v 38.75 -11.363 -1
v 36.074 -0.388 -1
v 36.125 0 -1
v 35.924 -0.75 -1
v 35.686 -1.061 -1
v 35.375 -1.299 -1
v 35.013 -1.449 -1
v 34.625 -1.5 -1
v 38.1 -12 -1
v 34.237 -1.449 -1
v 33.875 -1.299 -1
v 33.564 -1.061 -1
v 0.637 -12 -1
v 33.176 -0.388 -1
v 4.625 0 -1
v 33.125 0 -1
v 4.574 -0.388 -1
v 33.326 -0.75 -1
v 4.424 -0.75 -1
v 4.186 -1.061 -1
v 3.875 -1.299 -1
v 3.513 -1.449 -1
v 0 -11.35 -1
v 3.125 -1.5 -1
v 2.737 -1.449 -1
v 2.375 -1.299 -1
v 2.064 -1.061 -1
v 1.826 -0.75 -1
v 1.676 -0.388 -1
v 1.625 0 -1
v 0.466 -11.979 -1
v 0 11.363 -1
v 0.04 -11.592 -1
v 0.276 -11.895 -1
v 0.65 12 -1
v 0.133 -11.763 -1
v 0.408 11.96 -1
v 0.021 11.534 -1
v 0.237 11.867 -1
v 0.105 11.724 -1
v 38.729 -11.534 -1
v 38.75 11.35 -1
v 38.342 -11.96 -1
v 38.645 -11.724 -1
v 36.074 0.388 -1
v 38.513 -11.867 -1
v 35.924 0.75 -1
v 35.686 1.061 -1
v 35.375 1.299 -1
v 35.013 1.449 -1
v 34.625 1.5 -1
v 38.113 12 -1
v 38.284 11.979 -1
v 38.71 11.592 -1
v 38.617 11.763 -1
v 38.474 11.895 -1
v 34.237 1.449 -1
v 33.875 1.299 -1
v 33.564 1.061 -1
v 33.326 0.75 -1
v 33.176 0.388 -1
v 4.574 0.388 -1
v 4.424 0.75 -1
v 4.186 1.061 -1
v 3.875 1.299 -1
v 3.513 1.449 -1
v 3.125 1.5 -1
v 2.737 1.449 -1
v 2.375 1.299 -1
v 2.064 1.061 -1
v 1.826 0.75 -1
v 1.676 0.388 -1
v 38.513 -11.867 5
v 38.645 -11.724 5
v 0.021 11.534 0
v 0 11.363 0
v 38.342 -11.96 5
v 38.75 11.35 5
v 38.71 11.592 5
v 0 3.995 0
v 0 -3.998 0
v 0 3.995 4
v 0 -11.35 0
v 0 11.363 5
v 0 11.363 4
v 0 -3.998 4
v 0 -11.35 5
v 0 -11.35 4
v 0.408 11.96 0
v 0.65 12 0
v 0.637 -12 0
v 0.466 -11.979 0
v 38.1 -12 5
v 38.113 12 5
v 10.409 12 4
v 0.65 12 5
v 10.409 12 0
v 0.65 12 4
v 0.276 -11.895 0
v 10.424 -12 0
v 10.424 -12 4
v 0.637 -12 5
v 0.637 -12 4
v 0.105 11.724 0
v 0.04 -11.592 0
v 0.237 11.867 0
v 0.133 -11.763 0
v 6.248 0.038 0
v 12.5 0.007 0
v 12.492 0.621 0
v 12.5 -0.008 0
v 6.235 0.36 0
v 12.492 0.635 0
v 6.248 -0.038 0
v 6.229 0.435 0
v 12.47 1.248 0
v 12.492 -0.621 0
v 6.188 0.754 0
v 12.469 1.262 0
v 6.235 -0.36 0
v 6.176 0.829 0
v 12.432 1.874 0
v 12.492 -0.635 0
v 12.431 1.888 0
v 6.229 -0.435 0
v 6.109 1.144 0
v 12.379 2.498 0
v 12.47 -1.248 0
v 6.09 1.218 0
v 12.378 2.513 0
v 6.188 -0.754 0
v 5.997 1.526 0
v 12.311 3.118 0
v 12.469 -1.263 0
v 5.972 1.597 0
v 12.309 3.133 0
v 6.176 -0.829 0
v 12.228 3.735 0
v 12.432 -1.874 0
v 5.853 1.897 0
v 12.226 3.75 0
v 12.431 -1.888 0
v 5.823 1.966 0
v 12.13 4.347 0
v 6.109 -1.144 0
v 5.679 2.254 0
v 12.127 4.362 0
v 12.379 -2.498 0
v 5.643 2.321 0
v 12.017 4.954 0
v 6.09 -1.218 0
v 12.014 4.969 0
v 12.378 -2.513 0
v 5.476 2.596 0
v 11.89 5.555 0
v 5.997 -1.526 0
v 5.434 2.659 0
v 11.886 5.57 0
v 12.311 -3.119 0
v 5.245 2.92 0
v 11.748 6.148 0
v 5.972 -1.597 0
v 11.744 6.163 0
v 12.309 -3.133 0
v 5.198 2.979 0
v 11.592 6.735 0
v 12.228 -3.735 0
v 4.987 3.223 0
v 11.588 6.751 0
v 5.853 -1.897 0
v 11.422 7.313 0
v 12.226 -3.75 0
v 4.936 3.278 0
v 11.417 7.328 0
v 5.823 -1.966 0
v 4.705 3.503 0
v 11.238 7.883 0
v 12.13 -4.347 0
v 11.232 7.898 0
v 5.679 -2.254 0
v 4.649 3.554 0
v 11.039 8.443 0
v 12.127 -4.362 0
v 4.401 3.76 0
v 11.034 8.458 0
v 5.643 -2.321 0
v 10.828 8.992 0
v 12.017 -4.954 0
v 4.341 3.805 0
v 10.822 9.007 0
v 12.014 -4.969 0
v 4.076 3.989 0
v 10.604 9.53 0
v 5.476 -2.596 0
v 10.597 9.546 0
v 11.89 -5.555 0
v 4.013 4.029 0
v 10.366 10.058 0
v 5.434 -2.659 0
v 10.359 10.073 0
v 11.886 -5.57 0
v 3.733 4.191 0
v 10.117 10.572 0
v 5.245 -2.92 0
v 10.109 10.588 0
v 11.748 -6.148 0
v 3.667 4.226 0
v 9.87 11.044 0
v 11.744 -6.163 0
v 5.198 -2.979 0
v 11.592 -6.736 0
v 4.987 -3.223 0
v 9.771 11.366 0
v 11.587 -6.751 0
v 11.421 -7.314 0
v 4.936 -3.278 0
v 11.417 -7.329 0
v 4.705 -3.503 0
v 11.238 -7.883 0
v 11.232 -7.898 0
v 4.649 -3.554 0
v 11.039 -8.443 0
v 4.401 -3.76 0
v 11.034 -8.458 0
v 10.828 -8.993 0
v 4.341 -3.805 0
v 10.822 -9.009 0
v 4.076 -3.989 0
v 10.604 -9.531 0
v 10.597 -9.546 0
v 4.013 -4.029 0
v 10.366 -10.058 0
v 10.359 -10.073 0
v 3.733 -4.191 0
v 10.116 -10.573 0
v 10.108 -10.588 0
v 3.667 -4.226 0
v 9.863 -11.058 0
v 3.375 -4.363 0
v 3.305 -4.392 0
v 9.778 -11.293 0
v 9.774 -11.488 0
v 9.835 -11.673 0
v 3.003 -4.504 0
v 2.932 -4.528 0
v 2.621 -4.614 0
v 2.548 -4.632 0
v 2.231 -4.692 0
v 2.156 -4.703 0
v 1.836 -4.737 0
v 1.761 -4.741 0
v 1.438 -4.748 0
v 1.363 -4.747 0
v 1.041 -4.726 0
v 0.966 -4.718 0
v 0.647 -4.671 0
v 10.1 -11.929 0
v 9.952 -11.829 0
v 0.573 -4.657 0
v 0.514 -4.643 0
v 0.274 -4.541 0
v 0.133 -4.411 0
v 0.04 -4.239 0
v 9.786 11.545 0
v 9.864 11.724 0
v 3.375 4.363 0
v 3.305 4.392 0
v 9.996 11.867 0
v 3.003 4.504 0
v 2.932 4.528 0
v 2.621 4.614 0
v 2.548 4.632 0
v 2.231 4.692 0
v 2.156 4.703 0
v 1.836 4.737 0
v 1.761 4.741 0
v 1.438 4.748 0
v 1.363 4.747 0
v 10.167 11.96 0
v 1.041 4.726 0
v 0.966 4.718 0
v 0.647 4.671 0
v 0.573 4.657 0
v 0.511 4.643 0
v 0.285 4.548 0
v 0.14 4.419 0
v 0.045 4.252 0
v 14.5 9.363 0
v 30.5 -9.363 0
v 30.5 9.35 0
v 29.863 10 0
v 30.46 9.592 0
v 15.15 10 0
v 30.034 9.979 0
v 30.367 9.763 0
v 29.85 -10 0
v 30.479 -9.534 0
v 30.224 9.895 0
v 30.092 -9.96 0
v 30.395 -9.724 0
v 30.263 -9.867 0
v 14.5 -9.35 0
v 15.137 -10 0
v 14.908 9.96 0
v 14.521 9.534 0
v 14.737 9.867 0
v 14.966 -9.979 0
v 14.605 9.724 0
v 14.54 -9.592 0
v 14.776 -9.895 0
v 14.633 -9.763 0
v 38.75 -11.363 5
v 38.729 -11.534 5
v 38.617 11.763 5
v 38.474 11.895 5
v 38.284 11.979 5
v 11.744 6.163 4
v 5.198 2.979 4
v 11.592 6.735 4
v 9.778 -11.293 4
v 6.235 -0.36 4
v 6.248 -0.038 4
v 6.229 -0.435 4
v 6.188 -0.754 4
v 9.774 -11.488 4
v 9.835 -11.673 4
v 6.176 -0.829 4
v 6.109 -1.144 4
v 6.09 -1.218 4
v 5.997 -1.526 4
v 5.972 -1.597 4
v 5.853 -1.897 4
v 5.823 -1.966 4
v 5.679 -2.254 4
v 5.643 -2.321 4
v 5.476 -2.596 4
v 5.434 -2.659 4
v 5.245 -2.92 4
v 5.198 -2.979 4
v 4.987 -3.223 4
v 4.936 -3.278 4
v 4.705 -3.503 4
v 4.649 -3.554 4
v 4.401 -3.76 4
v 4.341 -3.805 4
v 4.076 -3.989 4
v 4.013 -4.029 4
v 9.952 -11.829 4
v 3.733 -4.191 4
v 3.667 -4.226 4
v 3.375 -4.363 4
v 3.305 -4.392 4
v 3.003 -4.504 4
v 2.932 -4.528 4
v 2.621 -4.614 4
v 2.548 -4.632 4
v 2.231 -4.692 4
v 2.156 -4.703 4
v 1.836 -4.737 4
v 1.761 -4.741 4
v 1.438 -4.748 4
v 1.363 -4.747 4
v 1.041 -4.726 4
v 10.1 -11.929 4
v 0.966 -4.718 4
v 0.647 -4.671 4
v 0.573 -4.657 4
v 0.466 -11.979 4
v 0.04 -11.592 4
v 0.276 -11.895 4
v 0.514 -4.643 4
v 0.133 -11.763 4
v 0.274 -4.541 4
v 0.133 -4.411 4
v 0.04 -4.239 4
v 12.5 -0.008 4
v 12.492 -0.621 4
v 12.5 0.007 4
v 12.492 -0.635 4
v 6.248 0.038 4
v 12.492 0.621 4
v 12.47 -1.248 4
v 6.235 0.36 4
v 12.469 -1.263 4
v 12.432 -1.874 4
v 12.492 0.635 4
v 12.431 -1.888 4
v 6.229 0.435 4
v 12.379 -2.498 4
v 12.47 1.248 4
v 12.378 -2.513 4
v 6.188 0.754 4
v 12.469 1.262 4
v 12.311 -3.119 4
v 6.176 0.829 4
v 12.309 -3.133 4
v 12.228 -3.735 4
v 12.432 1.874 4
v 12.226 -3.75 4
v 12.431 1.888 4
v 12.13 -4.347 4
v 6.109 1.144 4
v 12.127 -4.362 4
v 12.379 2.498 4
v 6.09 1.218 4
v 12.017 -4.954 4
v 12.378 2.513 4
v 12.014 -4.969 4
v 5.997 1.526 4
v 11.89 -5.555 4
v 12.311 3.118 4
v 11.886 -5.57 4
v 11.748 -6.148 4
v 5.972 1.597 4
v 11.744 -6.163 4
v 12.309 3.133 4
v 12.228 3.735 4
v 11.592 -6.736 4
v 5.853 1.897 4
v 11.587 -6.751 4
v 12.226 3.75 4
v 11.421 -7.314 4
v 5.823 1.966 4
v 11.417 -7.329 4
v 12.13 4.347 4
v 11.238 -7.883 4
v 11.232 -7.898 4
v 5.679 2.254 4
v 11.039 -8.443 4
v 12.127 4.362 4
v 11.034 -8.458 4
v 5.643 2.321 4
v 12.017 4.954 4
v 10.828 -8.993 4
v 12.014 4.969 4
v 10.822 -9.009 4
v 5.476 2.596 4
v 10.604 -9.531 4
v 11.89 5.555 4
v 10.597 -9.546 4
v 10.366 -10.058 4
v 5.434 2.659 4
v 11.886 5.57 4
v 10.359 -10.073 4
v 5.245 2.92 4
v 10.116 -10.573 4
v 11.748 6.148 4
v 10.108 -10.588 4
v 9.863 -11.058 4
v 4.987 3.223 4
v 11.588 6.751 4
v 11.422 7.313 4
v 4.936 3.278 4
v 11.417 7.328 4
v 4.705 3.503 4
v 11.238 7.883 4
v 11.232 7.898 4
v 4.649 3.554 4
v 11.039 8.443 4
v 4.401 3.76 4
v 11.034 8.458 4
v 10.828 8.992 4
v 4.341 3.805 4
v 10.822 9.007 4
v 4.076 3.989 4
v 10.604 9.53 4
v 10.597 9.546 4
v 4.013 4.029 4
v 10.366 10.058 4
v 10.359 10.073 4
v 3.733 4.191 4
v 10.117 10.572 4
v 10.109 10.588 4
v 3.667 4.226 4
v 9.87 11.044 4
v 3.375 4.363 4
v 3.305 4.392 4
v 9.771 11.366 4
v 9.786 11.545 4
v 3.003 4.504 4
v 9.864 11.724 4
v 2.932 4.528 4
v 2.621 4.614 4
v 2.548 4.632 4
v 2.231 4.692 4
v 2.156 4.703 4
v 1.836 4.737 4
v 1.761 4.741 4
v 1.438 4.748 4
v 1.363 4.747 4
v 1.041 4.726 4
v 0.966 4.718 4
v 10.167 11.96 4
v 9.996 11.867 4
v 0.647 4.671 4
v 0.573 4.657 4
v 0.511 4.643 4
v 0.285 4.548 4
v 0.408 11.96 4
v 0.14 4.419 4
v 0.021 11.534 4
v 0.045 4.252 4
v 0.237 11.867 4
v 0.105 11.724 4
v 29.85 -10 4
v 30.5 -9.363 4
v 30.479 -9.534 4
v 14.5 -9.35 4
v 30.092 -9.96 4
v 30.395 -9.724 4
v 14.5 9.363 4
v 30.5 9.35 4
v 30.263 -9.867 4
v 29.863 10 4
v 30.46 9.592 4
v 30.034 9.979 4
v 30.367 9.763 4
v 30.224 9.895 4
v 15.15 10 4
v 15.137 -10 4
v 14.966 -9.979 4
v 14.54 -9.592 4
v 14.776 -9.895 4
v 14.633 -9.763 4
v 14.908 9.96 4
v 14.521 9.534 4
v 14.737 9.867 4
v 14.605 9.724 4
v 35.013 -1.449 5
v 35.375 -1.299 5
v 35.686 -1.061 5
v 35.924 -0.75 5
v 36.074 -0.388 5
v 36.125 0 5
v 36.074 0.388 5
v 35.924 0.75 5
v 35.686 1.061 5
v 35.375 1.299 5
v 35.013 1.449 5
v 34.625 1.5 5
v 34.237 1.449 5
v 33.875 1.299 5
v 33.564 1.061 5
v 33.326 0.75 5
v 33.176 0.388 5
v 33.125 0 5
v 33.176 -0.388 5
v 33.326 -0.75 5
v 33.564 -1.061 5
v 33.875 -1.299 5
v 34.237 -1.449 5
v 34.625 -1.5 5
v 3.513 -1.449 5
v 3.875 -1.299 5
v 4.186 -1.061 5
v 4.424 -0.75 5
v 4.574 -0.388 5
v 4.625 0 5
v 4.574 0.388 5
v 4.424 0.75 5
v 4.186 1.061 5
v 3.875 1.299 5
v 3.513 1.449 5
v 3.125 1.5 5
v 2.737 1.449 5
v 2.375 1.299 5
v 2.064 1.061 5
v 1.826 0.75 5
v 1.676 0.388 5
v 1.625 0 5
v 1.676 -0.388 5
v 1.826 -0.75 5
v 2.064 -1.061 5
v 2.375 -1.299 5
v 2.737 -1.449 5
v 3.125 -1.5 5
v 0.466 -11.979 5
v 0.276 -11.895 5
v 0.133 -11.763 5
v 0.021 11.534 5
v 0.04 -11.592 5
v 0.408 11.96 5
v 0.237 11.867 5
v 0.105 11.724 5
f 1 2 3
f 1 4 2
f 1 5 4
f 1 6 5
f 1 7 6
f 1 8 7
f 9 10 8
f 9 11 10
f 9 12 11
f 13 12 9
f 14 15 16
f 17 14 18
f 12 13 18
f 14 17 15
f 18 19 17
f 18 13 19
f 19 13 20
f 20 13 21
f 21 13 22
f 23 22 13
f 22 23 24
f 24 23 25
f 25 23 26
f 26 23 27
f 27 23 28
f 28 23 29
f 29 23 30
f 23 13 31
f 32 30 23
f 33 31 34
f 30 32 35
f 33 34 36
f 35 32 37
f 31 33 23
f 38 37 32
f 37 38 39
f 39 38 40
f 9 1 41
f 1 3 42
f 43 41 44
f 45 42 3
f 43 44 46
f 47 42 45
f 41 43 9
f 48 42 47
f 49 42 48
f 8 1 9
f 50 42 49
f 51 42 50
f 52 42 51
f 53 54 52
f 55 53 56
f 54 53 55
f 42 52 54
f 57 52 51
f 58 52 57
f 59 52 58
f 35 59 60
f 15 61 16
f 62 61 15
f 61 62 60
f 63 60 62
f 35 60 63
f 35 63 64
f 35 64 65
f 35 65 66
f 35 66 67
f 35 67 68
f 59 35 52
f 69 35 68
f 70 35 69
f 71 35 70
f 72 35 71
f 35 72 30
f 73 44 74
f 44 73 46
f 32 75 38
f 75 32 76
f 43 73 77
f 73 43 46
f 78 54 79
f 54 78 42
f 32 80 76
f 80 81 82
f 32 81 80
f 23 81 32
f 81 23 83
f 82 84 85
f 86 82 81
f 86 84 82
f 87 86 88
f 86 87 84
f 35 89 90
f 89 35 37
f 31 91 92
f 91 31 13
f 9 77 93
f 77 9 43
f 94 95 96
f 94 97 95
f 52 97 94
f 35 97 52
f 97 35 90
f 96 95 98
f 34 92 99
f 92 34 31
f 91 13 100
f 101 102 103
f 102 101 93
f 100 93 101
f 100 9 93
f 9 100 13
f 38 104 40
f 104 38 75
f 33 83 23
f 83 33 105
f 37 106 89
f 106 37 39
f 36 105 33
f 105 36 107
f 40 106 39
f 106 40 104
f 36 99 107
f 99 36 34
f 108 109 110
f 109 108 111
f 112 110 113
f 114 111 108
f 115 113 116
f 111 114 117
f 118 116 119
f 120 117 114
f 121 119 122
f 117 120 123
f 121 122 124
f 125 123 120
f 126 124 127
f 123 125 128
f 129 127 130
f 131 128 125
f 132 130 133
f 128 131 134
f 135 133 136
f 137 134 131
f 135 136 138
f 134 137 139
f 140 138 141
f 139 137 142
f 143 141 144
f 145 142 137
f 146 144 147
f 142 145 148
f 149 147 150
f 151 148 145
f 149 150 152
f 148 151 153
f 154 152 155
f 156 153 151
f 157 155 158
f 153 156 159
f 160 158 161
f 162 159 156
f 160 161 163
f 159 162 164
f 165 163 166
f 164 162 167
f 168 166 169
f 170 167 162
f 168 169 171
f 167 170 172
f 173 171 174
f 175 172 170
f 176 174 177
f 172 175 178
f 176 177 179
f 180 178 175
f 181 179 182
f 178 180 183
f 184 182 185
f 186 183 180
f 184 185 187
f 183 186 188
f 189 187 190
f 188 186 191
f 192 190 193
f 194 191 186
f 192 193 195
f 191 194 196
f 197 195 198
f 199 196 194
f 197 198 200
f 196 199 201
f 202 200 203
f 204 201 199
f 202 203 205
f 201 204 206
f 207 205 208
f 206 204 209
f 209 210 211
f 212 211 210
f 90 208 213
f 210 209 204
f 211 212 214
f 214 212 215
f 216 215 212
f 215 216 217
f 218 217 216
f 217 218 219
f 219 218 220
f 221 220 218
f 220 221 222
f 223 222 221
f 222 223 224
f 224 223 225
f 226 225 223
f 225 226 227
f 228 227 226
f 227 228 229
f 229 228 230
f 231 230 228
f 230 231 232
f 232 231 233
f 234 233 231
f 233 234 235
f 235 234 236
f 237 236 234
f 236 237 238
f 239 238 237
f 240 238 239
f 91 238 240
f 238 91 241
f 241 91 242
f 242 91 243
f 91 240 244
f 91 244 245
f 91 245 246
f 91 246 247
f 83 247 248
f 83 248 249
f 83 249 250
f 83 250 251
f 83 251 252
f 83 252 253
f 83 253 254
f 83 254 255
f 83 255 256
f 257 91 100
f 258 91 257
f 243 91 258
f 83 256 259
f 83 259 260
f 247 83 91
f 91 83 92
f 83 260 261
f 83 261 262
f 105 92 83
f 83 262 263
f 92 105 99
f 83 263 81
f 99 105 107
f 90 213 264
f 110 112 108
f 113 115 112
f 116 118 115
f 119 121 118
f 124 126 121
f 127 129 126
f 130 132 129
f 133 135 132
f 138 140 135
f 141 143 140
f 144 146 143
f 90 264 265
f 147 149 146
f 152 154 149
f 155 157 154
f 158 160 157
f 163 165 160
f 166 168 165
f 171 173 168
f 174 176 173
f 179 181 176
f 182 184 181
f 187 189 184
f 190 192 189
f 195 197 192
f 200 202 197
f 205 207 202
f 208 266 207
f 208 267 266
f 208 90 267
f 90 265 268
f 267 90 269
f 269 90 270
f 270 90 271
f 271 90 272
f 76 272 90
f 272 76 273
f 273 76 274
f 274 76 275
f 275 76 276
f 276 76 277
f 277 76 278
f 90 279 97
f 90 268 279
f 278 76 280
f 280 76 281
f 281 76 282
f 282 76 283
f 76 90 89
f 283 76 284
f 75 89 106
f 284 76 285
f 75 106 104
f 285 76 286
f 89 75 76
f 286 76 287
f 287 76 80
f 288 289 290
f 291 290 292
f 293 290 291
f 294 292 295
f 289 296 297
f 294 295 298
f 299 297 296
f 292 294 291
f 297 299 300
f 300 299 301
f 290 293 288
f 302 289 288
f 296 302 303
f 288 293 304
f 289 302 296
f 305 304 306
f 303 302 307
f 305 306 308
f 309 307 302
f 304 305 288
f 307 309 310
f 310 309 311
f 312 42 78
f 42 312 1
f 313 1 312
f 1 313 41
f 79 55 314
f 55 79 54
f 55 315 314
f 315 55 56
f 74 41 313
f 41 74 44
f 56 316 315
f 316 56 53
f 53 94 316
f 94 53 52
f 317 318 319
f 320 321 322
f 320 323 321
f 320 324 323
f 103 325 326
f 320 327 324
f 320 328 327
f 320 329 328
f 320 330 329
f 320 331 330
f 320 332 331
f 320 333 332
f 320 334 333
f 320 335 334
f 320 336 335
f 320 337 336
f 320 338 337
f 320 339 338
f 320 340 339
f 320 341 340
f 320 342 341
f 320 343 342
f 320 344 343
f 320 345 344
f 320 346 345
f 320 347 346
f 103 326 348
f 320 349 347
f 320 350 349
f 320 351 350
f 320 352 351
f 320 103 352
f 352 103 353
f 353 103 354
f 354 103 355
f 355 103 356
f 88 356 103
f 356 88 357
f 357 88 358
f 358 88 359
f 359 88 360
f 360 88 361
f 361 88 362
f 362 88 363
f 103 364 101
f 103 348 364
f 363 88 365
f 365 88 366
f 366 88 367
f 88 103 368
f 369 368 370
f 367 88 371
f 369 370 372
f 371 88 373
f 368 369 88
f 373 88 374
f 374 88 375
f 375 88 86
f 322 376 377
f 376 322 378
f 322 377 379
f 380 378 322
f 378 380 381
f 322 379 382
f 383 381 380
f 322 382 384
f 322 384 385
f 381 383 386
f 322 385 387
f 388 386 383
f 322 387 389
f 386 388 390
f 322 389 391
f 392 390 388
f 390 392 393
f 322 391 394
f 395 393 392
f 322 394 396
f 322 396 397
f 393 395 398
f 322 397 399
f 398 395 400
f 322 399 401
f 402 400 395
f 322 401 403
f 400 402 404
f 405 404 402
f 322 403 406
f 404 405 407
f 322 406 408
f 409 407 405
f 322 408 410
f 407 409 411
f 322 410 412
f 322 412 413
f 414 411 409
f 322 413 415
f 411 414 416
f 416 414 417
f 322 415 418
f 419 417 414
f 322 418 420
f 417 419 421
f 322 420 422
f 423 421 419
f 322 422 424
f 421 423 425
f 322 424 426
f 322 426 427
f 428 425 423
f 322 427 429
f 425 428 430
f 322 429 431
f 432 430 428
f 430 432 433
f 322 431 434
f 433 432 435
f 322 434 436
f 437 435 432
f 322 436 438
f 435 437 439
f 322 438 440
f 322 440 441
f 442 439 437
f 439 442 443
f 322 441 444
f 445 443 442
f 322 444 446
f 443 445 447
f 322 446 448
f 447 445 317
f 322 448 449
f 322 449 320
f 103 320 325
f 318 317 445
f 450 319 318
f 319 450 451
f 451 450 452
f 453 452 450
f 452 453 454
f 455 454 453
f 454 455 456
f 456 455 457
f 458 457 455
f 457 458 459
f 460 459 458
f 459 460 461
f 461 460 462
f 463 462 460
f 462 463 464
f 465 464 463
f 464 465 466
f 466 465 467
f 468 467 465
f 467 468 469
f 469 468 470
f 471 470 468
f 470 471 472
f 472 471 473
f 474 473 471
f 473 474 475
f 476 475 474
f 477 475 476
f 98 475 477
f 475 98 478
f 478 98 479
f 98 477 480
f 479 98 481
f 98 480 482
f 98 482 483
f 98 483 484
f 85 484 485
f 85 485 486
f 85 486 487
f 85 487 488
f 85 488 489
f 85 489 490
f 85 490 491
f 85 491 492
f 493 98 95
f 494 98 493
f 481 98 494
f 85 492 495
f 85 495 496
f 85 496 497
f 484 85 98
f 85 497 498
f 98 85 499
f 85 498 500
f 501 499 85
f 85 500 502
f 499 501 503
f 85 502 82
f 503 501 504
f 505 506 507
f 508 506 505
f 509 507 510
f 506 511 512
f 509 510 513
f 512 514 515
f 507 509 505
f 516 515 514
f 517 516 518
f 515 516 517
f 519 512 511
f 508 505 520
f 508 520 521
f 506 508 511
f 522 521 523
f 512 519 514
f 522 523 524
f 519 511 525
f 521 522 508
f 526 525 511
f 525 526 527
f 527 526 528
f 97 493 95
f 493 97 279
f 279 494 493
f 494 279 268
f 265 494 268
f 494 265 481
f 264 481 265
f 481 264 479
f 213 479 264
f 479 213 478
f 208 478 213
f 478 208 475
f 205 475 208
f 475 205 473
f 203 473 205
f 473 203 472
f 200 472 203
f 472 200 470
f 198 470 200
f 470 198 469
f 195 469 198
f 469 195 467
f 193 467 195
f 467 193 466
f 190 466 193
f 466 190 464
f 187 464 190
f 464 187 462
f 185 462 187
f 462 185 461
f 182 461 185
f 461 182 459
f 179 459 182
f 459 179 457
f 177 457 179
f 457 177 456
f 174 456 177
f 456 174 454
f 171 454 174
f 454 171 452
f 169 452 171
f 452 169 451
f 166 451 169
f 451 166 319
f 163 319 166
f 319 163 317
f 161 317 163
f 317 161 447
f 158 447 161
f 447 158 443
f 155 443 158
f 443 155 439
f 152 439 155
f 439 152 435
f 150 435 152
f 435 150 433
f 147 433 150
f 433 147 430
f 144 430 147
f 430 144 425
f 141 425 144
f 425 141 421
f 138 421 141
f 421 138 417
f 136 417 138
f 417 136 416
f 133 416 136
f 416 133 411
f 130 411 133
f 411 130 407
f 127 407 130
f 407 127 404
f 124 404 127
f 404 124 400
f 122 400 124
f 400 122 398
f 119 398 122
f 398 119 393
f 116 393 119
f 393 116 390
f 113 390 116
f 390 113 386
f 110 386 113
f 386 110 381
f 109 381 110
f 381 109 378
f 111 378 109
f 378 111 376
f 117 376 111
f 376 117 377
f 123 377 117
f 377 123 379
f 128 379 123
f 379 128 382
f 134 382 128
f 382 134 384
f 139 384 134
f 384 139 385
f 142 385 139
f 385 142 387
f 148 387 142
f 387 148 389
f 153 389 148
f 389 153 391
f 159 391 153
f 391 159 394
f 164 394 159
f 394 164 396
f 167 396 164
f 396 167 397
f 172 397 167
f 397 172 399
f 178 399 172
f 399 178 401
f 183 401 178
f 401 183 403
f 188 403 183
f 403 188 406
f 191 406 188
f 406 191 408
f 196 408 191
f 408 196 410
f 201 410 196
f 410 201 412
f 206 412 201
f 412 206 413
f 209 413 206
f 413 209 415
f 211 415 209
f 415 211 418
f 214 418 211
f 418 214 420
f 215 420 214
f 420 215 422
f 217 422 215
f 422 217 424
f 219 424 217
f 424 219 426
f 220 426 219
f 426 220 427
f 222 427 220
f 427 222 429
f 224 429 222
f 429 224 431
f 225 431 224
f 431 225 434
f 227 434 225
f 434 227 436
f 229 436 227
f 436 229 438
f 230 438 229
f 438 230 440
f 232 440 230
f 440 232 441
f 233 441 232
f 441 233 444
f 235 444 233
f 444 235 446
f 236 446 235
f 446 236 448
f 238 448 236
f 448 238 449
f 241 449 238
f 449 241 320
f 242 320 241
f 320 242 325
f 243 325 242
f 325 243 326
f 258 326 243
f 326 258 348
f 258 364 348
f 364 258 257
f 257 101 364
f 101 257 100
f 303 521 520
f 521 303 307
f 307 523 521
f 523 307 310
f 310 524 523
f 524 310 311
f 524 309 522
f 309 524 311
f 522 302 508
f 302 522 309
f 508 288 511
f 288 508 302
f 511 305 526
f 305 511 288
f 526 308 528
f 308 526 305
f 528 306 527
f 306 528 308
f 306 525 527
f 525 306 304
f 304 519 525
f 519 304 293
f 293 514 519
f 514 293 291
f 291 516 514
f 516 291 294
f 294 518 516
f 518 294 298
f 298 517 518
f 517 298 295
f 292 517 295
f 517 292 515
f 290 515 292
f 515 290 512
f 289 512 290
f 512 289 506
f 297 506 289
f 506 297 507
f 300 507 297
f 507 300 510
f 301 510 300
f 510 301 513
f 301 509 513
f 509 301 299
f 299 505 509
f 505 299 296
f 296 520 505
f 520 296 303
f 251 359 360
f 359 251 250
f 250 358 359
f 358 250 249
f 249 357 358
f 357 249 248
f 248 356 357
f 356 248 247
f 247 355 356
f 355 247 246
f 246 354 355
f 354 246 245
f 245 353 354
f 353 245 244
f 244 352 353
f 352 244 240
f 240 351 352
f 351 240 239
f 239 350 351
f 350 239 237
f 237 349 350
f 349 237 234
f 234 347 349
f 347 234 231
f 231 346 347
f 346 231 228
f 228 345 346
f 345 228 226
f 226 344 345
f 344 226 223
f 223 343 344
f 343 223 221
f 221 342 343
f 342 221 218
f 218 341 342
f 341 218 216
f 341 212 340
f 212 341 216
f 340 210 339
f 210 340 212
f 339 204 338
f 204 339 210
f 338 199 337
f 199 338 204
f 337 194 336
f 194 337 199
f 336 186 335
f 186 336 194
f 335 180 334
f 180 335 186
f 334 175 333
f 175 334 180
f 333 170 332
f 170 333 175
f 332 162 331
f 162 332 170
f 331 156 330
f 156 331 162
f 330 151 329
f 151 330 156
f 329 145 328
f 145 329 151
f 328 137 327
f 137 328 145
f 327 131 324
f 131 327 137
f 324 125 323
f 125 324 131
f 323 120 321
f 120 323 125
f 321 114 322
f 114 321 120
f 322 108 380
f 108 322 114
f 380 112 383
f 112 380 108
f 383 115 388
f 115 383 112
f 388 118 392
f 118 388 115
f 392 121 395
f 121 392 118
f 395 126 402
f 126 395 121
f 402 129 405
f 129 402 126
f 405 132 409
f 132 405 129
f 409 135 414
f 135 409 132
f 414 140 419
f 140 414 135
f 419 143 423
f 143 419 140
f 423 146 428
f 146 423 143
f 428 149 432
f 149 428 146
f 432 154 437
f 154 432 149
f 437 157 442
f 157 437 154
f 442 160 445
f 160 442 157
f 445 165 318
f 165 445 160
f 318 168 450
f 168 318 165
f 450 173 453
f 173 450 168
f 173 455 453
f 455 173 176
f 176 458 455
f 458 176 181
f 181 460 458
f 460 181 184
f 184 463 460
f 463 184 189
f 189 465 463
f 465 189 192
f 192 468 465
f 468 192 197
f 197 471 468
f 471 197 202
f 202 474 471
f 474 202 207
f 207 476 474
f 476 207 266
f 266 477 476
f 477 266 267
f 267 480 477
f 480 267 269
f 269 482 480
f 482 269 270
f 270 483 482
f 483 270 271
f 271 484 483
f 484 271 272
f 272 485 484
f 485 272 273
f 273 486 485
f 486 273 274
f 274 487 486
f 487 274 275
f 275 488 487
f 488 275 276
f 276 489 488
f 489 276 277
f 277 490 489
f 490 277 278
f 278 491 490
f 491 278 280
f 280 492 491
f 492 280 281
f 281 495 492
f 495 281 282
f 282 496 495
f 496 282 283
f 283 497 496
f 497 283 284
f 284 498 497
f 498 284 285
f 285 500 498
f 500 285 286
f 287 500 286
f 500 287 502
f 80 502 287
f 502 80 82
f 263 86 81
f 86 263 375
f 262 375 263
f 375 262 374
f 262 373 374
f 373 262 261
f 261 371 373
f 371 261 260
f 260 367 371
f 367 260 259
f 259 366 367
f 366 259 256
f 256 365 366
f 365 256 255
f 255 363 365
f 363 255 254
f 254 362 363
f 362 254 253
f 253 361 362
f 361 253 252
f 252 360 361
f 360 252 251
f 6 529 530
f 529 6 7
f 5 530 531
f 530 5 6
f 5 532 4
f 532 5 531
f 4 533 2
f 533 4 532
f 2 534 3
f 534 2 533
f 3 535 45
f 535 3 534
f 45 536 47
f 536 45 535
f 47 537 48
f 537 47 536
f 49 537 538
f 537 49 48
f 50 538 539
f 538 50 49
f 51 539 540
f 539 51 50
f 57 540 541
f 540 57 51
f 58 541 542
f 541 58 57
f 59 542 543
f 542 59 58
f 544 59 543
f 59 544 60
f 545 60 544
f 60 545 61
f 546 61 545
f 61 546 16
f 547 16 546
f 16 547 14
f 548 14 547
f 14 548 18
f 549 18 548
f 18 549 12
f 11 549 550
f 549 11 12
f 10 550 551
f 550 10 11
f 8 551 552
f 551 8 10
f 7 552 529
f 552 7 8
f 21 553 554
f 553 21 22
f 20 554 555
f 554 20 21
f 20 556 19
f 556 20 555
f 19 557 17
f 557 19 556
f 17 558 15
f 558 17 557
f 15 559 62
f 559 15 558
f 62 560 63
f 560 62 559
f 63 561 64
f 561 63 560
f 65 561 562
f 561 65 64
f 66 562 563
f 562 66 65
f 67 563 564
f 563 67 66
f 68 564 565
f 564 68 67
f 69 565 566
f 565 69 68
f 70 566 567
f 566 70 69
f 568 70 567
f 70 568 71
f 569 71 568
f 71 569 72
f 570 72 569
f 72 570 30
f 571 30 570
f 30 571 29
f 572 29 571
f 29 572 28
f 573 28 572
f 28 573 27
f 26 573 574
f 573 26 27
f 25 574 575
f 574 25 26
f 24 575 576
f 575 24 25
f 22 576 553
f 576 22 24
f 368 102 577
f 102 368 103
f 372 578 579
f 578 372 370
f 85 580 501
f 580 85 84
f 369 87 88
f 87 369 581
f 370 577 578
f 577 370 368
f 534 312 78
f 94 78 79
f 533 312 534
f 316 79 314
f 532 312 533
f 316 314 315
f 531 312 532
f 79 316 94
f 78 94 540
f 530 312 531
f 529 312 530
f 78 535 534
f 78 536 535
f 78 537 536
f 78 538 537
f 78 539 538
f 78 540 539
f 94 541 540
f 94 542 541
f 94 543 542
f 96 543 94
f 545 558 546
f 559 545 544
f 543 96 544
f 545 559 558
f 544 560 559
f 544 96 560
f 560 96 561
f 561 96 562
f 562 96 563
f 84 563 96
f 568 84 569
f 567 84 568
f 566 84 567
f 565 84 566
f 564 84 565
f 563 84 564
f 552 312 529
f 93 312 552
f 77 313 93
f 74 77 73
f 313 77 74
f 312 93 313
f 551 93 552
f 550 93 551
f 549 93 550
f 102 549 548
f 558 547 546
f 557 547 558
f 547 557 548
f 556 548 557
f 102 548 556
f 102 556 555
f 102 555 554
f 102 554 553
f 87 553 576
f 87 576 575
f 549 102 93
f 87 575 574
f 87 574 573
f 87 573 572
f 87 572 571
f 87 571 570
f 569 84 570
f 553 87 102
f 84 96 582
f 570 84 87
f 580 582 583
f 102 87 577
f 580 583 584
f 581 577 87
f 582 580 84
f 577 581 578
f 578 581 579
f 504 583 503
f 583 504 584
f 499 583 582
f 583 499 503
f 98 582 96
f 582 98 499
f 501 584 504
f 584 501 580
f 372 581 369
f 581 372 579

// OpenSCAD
/*
 * Slide lock magnet holder
 * By smkent (GitHub) / bulbasaur0 (Printables)
 *
 * Licensed under Creative Commons (4.0 International License) Attribution-ShareAlike
 */

/* [Rendering Options] */
Print_Orientation = true;
Show_Slide = true;
Part = "both"; // ["both": Base and lid, "base": Base, "lid": Lid]

/* [Size] */
Screw_Diameter = 2.5; // [2:0.5:4]
Screw_Hole_Diameter = 3; // [2:0.1:10]

Base_Thickness = 1; // [1:0.1:4]
Lid_Thickness = 1; // [1:0.1:4]

/* [Advanced Options] */

/* [Development Toggles] */

module __end_customizer_options__() { }

// Constants //

$fa = $preview ? $fa : 2;
$fs = $preview ? $fs : 0.4;

slide_size = [12.5, 24, 4];

slide_hole_d = 9.5;
slide_hole_inset = 11;

holder_base_thick = Base_Thickness;
holder_lid_thick = Lid_Thickness;
holder_thick = 2;
holder_size = [20, 24, 2];
holder_screw_d = Screw_Diameter;
holder_screw_hole_d = Screw_Hole_Diameter;
holder_screw_base_d = holder_screw_d * 2.5;

rr = 0.6;

// Functions //

function vec_add(vector, add) = [for (v = vector) v + add];

// Modules //

module slide_body_shape() {
    intersection() {
        difference() {
            translate([0, -slide_size.y / 2])
            square([slide_size.x, slide_size.y]);
            translate([slide_size.x - slide_hole_inset, 0])
            circle(d=slide_hole_d);
        }
        scale([1, (slide_size.y * 1.5) / (slide_size.x * 2)])
        circle(d=slide_size.x * 2);
    }
}

module slide_body() {
    linear_extrude(height=slide_size.z)
    slide_body_shape();
}

module round_shape() {
    offset(r=-rr)
    offset(r=rr*2)
    offset(r=-rr)
    children();
}

module at_holder_screws() {
    for (ox = [
        slide_size.x + holder_size.x + holder_screw_base_d / 2 - holder_thick / 2,
        holder_screw_base_d / 2
    ])
    translate([ox, 0])
    children();
}

module holder_screw_holes() {
    render()
    difference() {
        children();
        linear_extrude(height = (holder_base_thick + slide_size.z) * 10, center=true)
        at_holder_screws()
        circle(d=holder_screw_hole_d);
    }
}

module holder_base_shape() {
    translate([0, -slide_size.y / 2])
    round_shape()
    square([slide_size.x + holder_size.x + holder_screw_base_d, holder_size.y]);
}

module holder() {
    // Back
    translate([0, 0, -holder_base_thick])
    linear_extrude(height=holder_base_thick)
    holder_base_shape();

    // Body
    linear_extrude(height=slide_size.z)
    difference() {
        round_shape()
        difference() {
            translate([0, -holder_size.y / 2])
            square([slide_size.x + holder_size.x + holder_screw_base_d, holder_size.y]);
            slide_body_shape();
        }
        translate([slide_size.x, -holder_size.y / 2])
        translate([holder_thick, holder_thick])
        round_shape()
        square(vec_add([holder_size.x, holder_size.y], -holder_thick * 2));
    }
}

module holder_lid() {
    translate([0, 0, slide_size.z])
    linear_extrude(height=holder_lid_thick)
    holder_base_shape();
}

module main() {
    if (Part == "both" || Part == "base") {
        if (Show_Slide && $preview)
        color("lightsteelblue", 0.9)
        slide_body();
        color("darkseagreen", 0.9)
        holder_screw_holes()
        holder();
    }
    if (Part == "both" || Part == "lid") {
        color("lemonchiffon", 0.5)
        holder_screw_holes()
        holder_lid();
    }
}

main();
